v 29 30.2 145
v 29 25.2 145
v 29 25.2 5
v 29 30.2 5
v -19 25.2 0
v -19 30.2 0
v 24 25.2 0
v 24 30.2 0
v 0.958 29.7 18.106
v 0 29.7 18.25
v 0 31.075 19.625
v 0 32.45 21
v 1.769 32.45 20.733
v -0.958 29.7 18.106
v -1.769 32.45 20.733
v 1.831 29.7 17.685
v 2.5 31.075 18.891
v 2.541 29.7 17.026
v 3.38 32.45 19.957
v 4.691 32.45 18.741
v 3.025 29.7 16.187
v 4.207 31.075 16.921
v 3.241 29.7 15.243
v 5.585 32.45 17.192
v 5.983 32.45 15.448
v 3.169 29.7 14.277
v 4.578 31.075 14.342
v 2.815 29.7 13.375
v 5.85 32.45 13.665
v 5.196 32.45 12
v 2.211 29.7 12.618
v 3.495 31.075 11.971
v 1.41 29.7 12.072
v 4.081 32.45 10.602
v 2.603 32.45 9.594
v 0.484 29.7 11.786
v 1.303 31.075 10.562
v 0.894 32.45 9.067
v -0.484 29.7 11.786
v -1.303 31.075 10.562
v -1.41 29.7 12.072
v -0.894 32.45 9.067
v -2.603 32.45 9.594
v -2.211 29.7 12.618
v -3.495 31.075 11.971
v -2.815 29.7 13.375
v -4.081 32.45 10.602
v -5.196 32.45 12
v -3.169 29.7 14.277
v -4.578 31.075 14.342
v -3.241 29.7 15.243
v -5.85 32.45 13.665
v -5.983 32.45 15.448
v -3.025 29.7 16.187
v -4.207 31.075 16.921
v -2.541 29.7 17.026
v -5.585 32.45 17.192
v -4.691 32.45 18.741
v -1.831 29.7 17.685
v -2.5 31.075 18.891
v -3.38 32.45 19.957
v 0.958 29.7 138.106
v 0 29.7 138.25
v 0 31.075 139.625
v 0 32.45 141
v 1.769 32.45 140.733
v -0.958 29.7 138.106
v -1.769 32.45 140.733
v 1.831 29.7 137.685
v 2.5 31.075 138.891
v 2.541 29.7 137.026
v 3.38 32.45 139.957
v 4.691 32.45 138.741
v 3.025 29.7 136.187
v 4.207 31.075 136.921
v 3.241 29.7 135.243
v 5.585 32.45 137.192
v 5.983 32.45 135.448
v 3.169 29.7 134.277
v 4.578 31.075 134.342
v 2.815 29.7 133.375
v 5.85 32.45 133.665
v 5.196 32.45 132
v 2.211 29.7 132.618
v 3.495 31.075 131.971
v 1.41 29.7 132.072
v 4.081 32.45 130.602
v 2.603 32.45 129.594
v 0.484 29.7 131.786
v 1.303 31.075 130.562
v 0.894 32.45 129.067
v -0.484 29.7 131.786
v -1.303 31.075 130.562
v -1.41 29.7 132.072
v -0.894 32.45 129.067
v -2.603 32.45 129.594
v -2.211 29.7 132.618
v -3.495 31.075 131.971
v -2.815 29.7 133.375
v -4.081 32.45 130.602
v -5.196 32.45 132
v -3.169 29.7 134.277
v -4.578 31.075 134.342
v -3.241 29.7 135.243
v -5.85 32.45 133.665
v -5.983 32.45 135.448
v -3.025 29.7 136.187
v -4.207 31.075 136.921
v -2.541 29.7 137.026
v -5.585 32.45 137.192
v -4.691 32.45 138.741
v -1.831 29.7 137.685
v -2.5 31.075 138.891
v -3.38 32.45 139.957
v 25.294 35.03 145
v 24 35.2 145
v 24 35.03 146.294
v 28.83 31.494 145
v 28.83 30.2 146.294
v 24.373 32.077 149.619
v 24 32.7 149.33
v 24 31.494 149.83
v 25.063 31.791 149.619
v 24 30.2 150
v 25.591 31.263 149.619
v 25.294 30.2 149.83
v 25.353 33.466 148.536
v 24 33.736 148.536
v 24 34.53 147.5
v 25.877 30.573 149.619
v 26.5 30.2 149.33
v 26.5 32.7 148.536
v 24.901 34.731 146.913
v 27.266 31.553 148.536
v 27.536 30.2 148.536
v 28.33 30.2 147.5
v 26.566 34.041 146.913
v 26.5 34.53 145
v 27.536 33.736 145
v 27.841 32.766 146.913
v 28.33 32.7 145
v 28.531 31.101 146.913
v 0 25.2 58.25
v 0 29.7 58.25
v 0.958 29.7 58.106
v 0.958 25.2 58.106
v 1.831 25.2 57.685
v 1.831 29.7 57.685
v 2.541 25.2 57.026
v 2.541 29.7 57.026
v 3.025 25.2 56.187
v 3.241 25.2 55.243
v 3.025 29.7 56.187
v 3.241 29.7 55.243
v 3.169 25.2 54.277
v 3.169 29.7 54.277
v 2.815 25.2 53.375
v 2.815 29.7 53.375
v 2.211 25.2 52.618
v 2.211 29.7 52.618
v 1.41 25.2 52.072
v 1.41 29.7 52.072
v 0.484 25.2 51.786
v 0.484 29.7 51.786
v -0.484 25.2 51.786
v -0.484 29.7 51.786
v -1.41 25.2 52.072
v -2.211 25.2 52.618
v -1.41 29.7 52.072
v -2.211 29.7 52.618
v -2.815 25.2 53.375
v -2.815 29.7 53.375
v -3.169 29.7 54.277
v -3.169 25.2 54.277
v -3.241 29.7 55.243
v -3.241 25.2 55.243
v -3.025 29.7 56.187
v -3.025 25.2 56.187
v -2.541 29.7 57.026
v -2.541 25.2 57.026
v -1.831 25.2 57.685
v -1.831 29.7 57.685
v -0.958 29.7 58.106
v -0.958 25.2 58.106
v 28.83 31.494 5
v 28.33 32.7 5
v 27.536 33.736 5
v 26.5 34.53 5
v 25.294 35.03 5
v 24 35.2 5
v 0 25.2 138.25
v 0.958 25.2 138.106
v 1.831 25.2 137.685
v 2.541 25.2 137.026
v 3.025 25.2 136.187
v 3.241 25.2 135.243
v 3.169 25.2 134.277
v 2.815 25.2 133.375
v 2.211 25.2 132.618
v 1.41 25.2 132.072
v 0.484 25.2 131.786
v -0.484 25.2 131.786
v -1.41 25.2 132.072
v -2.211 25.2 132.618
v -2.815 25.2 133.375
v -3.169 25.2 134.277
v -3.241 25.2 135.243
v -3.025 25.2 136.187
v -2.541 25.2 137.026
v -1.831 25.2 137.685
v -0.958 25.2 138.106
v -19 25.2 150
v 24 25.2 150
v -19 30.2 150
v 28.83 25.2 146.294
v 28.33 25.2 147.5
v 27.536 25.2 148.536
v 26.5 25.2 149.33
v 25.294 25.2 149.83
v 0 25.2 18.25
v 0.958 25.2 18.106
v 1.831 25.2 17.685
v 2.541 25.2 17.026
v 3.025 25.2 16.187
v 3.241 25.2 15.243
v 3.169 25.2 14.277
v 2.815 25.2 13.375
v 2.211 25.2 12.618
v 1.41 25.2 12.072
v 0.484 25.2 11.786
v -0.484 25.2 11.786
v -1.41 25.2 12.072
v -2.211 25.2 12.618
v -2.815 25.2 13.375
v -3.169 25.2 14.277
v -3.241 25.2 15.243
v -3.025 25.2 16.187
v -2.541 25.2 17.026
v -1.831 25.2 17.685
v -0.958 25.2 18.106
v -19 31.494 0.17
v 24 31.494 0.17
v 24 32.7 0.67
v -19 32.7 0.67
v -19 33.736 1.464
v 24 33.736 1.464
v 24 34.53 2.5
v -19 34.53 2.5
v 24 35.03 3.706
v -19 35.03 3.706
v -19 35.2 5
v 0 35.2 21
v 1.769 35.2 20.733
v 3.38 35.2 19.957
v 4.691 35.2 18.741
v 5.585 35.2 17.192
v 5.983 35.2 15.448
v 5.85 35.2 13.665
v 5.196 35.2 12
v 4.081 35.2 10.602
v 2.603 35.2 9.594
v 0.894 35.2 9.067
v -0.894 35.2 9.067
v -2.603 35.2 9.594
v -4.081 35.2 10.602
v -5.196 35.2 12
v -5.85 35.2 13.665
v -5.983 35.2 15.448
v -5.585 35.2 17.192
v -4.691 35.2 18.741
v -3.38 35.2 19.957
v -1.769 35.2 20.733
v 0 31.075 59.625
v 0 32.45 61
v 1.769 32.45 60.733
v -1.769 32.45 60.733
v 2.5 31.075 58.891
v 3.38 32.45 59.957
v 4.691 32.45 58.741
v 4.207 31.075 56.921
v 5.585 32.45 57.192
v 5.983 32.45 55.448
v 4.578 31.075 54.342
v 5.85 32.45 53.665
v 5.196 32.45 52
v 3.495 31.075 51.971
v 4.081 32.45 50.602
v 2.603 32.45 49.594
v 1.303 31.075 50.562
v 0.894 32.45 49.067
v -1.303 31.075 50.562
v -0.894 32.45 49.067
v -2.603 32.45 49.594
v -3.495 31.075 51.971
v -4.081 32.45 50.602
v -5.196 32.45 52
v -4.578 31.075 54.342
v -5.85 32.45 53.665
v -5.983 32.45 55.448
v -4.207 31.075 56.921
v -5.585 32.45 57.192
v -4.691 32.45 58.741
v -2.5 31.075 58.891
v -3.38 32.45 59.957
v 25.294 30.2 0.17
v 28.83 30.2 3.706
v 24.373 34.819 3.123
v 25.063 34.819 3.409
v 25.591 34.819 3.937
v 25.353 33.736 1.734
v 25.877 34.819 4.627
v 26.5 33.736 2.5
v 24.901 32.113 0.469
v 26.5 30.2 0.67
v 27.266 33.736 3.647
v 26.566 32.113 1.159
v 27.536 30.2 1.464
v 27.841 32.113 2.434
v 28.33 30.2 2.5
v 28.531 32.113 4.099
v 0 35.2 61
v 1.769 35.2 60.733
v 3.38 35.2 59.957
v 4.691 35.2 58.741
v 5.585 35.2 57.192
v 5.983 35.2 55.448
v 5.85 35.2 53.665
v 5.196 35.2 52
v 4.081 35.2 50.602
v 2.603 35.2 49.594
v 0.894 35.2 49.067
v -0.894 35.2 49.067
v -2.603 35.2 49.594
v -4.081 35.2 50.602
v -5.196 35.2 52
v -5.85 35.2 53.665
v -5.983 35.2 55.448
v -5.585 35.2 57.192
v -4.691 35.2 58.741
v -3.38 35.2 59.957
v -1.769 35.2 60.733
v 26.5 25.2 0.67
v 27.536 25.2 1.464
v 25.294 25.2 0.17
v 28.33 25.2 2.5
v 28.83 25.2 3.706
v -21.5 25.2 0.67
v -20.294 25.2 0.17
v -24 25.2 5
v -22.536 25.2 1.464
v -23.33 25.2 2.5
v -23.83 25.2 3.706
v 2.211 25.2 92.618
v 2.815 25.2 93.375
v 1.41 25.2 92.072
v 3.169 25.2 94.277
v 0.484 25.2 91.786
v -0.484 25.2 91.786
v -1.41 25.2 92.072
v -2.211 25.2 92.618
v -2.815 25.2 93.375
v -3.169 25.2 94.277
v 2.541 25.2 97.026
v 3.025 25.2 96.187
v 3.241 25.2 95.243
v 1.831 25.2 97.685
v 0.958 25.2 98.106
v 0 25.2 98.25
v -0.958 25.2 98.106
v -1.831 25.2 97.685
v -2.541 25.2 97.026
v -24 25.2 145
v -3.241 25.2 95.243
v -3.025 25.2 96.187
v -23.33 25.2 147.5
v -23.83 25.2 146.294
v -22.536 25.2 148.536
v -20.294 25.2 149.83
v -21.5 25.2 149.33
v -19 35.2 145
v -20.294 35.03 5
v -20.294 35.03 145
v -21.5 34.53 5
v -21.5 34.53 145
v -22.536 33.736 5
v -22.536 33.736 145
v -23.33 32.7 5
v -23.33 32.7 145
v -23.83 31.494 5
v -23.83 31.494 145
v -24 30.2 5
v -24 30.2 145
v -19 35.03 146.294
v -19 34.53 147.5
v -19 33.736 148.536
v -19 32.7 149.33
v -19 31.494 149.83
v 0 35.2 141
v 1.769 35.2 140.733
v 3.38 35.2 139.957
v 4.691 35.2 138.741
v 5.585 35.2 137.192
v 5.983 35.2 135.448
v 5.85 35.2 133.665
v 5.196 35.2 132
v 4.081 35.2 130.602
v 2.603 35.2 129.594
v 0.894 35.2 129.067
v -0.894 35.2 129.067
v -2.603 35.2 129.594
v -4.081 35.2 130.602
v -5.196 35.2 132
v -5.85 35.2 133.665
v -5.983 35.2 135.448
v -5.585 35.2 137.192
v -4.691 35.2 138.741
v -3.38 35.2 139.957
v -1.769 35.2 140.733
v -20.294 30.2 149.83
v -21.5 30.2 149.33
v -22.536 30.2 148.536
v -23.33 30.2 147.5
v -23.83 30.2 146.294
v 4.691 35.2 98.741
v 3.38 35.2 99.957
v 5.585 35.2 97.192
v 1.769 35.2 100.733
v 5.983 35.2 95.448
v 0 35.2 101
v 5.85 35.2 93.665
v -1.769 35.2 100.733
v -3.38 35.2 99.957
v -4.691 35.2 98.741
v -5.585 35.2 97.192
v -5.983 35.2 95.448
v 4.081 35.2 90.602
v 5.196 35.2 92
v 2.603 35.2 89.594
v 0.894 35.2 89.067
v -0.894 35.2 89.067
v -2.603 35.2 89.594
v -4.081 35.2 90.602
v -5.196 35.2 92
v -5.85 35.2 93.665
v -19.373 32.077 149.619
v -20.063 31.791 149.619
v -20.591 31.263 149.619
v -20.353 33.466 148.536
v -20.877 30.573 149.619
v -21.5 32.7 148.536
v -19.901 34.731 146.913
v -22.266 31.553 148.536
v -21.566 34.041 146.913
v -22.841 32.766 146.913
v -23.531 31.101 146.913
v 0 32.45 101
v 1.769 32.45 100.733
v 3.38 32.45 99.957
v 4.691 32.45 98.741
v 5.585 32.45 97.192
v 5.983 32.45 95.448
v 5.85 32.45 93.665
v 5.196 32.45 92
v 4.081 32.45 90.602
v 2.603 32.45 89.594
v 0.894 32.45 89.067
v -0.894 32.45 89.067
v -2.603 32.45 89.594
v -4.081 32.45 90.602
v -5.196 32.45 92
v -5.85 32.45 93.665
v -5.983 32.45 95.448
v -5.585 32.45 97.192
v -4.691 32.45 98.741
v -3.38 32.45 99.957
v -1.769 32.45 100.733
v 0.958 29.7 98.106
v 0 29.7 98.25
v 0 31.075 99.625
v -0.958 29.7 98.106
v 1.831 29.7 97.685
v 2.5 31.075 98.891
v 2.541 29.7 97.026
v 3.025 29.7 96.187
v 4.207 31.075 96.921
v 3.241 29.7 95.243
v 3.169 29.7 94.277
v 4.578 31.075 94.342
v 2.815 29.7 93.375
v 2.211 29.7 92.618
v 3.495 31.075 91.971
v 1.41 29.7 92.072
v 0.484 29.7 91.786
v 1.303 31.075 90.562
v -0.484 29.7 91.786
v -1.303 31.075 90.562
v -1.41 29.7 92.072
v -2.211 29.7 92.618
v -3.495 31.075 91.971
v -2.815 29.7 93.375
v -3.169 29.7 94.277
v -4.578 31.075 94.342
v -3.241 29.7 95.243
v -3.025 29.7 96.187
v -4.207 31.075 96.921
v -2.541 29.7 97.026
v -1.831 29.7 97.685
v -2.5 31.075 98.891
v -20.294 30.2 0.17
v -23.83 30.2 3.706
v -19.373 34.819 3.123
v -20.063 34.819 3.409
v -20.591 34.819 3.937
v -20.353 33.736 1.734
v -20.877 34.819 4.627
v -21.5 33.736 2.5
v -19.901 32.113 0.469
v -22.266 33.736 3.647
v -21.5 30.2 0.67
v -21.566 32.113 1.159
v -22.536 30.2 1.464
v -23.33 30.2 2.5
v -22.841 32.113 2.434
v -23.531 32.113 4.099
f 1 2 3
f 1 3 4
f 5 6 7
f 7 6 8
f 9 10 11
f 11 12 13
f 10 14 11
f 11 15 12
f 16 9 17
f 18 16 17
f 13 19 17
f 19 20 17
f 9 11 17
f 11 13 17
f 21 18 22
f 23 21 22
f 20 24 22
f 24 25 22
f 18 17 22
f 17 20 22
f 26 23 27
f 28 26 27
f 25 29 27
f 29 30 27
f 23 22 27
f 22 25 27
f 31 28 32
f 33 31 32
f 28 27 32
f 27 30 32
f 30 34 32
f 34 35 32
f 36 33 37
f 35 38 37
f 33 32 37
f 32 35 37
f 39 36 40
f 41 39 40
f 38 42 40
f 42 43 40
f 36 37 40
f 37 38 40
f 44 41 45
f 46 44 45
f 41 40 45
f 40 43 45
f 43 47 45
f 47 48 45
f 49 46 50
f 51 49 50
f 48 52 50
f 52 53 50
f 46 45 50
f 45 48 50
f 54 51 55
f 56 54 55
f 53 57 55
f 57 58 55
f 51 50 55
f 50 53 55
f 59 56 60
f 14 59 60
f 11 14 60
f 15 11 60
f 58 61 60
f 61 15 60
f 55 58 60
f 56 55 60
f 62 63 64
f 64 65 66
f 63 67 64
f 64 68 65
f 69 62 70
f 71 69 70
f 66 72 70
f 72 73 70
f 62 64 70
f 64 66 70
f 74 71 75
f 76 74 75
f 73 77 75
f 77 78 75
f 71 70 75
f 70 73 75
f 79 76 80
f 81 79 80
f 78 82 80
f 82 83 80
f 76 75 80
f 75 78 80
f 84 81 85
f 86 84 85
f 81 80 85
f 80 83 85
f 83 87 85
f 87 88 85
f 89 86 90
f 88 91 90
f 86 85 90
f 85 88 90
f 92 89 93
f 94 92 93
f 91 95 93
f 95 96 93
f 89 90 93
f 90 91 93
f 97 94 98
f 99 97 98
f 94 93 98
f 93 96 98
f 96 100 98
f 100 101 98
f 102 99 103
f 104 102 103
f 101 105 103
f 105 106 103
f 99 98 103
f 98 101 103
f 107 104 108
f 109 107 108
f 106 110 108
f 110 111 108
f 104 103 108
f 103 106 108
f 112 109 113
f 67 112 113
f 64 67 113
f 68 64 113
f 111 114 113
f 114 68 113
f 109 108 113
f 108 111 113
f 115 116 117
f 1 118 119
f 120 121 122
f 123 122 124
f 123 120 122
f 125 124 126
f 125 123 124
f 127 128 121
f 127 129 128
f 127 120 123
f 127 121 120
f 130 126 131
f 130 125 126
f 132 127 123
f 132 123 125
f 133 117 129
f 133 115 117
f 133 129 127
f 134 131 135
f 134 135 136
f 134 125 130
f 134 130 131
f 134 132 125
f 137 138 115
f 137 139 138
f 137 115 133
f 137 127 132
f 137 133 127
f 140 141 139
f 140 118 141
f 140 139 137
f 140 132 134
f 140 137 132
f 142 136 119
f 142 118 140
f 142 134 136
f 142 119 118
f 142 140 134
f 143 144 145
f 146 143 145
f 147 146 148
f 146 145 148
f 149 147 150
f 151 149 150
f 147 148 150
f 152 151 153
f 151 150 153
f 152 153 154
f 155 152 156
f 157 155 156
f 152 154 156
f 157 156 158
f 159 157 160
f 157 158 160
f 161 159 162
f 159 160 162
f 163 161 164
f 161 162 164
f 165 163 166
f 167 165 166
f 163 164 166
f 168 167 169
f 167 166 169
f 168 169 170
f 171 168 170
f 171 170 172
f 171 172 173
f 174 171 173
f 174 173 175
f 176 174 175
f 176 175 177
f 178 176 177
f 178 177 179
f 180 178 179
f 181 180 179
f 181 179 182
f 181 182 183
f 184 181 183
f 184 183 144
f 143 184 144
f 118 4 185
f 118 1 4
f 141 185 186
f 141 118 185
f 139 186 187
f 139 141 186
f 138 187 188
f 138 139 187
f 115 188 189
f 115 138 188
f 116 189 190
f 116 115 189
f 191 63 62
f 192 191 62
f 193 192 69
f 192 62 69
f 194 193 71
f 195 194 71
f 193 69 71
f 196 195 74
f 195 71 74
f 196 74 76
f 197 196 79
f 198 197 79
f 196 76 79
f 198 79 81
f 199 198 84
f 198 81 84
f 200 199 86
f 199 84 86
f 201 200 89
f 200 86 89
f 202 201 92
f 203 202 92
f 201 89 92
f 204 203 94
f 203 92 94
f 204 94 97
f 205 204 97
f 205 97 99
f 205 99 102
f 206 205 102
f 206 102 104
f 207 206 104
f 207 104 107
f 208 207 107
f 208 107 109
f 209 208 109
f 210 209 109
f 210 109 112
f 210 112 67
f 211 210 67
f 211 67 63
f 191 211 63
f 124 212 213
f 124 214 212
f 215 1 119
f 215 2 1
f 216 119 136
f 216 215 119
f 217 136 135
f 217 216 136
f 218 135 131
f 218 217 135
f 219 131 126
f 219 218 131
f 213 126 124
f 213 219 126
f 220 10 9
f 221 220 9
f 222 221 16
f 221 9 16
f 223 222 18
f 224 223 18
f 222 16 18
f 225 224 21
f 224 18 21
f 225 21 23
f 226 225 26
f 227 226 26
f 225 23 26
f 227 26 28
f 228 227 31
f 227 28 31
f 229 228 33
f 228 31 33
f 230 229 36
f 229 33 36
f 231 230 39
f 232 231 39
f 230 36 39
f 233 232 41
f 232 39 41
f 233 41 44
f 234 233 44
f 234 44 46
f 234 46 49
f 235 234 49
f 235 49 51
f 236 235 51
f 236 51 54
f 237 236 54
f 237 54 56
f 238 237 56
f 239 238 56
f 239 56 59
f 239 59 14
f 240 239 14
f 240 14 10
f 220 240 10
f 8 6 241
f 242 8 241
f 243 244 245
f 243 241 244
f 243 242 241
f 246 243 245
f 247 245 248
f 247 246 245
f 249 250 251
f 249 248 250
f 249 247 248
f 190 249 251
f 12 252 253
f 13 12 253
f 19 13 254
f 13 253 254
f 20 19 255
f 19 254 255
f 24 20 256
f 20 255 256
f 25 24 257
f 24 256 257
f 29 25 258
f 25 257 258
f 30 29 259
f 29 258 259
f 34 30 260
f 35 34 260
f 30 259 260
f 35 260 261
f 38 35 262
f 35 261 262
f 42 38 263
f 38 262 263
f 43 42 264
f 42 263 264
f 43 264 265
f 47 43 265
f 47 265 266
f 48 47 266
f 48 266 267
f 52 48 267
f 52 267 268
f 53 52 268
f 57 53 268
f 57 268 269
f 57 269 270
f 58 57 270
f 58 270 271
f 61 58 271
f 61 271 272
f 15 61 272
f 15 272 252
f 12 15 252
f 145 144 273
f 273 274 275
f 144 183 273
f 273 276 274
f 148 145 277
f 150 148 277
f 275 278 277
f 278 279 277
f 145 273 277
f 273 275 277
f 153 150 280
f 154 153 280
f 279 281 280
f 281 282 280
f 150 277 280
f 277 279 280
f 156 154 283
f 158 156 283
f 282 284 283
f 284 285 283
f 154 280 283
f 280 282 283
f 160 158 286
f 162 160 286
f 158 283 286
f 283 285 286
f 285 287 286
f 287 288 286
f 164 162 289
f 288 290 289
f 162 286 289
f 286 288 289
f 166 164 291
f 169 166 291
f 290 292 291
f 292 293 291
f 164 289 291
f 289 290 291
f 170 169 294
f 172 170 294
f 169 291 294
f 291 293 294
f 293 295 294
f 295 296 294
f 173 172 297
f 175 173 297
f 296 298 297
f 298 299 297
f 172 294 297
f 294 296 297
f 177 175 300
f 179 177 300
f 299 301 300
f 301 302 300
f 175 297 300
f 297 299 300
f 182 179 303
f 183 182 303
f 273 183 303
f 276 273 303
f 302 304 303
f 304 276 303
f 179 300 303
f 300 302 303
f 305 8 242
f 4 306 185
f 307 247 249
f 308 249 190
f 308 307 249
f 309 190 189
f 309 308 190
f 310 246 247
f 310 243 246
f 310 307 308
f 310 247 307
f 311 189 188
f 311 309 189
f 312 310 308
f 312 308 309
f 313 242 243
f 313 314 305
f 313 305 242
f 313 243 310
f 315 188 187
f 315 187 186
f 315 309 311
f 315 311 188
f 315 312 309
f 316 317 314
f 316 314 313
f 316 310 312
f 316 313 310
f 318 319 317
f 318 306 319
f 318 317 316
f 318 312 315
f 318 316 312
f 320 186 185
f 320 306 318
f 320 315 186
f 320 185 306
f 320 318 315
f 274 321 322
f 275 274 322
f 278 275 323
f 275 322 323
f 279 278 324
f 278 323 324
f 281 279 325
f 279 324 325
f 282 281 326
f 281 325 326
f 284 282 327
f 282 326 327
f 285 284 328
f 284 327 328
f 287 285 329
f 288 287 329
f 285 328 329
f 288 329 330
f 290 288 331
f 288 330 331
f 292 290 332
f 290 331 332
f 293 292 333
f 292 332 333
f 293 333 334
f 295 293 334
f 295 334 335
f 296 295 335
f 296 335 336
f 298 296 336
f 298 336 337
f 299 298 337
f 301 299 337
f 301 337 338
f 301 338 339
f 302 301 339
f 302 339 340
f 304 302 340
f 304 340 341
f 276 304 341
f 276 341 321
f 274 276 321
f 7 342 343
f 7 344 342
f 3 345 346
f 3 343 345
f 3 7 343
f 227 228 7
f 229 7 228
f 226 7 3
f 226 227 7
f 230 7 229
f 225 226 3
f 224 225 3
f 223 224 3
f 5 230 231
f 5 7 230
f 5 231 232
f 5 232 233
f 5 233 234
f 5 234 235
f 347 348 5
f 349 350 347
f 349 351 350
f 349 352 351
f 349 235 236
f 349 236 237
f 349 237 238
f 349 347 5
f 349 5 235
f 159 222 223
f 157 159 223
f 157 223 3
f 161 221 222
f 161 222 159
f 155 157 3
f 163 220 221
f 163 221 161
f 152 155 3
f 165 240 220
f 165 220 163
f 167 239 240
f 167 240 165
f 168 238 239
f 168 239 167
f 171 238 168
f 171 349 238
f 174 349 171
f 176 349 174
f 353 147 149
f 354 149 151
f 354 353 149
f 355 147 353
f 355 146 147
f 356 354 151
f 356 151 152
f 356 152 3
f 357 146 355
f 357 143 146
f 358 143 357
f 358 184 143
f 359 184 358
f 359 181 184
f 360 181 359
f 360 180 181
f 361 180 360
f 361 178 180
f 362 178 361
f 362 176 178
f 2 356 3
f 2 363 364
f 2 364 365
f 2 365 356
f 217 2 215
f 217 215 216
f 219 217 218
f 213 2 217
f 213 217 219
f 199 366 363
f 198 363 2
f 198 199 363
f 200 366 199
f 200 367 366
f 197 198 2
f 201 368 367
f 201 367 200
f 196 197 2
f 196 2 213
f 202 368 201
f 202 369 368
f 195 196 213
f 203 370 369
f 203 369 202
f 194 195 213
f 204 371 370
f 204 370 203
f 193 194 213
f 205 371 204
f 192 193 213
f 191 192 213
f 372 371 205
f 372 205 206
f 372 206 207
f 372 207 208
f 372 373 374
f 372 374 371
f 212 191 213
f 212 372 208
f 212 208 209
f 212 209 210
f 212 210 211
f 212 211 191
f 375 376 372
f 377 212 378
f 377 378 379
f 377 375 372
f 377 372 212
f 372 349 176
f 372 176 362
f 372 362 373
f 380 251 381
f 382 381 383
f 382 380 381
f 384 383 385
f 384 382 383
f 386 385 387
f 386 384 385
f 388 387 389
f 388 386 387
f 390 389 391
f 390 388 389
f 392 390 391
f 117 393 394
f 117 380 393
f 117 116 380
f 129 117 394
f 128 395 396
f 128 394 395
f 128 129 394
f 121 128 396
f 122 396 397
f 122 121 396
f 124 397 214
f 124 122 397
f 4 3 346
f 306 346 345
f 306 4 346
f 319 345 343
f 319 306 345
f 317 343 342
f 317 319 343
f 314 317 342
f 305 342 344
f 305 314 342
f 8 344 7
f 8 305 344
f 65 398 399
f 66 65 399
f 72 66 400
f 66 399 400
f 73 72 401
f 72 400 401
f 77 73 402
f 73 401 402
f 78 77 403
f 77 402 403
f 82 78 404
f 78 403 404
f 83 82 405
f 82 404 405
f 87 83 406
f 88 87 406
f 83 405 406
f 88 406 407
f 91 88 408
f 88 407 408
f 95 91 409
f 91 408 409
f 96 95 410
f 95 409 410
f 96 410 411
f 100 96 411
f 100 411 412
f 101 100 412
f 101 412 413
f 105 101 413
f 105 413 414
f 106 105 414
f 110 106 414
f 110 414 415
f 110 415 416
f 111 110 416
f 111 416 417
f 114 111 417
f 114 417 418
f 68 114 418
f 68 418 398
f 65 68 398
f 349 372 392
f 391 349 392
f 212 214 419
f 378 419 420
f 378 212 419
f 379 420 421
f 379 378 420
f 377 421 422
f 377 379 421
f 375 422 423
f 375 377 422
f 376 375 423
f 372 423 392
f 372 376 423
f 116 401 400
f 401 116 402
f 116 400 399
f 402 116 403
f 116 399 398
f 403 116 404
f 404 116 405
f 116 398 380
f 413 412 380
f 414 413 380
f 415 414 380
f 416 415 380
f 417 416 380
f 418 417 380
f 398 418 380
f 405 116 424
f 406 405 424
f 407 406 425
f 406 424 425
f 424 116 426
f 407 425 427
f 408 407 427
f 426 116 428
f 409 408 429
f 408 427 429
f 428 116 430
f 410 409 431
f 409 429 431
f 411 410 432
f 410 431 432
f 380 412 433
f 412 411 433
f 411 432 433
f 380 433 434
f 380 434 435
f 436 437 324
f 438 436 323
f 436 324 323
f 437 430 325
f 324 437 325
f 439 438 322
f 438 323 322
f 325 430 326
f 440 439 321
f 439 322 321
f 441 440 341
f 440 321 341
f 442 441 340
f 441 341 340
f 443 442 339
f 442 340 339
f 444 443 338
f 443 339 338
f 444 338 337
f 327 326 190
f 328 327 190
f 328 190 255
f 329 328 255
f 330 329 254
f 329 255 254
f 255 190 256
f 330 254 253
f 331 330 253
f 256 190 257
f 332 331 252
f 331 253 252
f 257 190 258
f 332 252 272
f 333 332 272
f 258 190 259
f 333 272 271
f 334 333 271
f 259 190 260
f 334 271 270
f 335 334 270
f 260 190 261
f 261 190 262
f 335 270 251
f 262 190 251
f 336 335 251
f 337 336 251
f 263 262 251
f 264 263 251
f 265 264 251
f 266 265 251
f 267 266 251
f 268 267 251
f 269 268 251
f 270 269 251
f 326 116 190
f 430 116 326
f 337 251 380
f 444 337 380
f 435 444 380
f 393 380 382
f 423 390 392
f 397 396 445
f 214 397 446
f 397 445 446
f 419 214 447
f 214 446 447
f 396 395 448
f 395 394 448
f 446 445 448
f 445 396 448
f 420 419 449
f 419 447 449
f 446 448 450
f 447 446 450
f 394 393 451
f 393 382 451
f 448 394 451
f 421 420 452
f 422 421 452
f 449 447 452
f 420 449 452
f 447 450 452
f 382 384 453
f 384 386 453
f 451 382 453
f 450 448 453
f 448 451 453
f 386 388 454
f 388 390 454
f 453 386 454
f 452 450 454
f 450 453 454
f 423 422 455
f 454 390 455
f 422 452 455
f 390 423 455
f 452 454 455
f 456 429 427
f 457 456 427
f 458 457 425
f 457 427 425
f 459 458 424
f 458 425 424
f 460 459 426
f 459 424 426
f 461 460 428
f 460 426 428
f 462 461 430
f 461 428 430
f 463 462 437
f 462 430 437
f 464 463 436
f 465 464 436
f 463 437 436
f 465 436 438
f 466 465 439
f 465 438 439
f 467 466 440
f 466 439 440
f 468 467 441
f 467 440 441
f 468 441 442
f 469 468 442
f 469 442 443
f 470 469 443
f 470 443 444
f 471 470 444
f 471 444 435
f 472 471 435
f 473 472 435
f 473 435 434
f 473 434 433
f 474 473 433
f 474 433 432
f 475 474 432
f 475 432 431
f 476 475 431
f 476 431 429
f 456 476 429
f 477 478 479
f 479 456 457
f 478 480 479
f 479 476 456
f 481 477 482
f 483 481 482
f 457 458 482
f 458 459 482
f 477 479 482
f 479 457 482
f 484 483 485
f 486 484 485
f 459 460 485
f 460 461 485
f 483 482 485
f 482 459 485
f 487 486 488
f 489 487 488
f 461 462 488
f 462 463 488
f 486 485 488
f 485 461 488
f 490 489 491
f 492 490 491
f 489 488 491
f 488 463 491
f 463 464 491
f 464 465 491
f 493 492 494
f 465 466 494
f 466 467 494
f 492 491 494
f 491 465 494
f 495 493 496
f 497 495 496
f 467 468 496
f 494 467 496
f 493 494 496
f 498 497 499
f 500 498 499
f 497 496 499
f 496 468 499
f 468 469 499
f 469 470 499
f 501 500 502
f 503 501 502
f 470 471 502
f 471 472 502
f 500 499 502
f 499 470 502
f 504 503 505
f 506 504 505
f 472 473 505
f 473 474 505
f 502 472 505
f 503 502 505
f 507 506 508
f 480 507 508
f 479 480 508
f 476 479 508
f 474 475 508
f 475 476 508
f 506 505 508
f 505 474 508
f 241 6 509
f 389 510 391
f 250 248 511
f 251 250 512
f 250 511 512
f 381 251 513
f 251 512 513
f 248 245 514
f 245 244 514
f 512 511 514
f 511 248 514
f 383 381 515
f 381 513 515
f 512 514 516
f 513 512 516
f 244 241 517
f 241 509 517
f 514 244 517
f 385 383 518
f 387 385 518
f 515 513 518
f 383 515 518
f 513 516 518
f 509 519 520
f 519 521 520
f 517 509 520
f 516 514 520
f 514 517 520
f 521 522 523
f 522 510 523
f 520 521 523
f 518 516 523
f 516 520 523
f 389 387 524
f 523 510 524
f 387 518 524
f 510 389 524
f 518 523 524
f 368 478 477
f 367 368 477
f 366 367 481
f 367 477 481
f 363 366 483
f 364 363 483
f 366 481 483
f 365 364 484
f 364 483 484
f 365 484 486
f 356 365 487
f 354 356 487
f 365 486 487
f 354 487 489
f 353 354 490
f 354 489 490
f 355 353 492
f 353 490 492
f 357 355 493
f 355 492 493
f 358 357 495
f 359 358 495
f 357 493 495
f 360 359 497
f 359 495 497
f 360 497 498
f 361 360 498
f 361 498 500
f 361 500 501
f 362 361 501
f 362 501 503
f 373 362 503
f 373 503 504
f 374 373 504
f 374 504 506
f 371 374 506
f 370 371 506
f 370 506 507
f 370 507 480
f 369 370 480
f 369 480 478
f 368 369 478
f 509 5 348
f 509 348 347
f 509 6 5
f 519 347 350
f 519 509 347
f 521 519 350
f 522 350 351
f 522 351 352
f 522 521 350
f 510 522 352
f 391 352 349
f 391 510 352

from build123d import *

# Parameters (mm, degrees)
SKETCH1_W               = 48
SKETCH1_H               = 48
SKETCH1_R               = 13.75
SKETCH1_H_2             = 10
BOSS_EXTRUDE1_DEPTH     = 230
SKETCH3_R               = 6
CUT_EXTRUDE1_DEPTH      = 0.5
SKETCH4_R               = 3.25
CUT_EXTRUDE2_DEPTH      = 240.26061105
CUT_EXTRUDE3_REACH      = 241.261
CUT_EXTRUDE3_END_RADIUS = 13.75
SKETCH5_R               = 6.5
CUT_EXTRUDE4_REACH      = 243.738
CUT_EXTRUDE4_END_RADIUS = 13.75
CUT_EXTRUDE4_START      = -5
CHAMFER1_SIZE           = 5
SKETCH8_W               = 230
SKETCH8_H               = 1.2
CUT_EXTRUDE5_DEPTH      = 10
SKETCH9_W               = 53
SKETCH9_H               = 80
CUT_EXTRUDE6_DEPTH      = 233.036635039
FILLET2_R               = 5


with BuildPart() as part:
    # Sketch1 → Boss-Extrude1 (new body)
    # profile 1 of 3: a face of its own
    with BuildSketch(Plane.XY):
        Rectangle(SKETCH1_W, SKETCH1_H)
        Circle(SKETCH1_R, mode=Mode.SUBTRACT)
    # profile 2 of 3: a face of its own
    with BuildSketch(Plane.XY):
        with Locations((0, 30.2)):
            Rectangle(SKETCH1_W, SKETCH1_H_2)
    # profile 3 of 3: a face of its own
    with BuildSketch(Plane.XY):
        Polygon((24, 24), (24, -24), (29, -24), (29, 35.2), (24, 35.2), (24, 25.2), align=None)
    extrude(amount=BOSS_EXTRUDE1_DEPTH)

    # Sketch3 → Cut-Extrude1 (cut)
    with BuildSketch(Plane(origin=(0, 35.2, 0), x_dir=(1, 0, 0), z_dir=(0, 1, 0))):
        with Locations(Location((0, -15, 0), (0, 0, 270))):
            Circle(SKETCH3_R)
        with Locations(Location((0, -55, 0), (0, 0, 270))):
            Circle(SKETCH3_R)
        with Locations(Location((0, -95, 0), (0, 0, 270))):
            Circle(SKETCH3_R)
        with Locations(Location((0, -135, 0), (0, 0, 270))):
            Circle(SKETCH3_R)
        with Locations(Location((0, -175, 0), (0, 0, 270))):
            Circle(SKETCH3_R)
        with Locations(Location((0, -215, 0), (0, 0, 270))):
            Circle(SKETCH3_R)
    extrude(amount=-CUT_EXTRUDE1_DEPTH, mode=Mode.SUBTRACT)

    # Sketch4 → Cut-Extrude2 (cut, through all)
    with BuildSketch(Plane(origin=(0, 35.2, 0), x_dir=(1, 0, 0), z_dir=(0, 1, 0))):
        with Locations(Location((0, -15, 0), (0, 0, 270))):
            Circle(SKETCH4_R)
        with Locations(Location((0, -55, 0), (0, 0, 270))):
            Circle(SKETCH4_R)
        with Locations(Location((0, -95, 0), (0, 0, 270))):
            Circle(SKETCH4_R)
        with Locations(Location((0, -135, 0), (0, 0, 270))):
            Circle(SKETCH4_R)
        with Locations(Location((0, -175, 0), (0, 0, 270))):
            Circle(SKETCH4_R)
        with Locations(Location((0, -215, 0), (0, 0, 270))):
            Circle(SKETCH4_R)
    extrude(amount=-CUT_EXTRUDE2_DEPTH, mode=Mode.SUBTRACT)

    # Cut-Extrude3: up to this cylinder (the profile starts outside it)
    cut_extrude3_end = Plane(origin=(0, 0, 115), z_dir=(0, 0, -1)) * Cylinder(CUT_EXTRUDE3_END_RADIUS, 711.022, mode=Mode.PRIVATE)
    # Sketch5 → Cut-Extrude3 (cut, up to the surface)
    with BuildSketch(Plane.XZ.offset(24), mode=Mode.PRIVATE) as cut_extrude3_sk1:
        with Locations(Location((0, 215, 0), (0, 0, 270))):
            Circle(SKETCH5_R)
    cut_extrude3_tool1 = extrude(cut_extrude3_sk1.sketch, amount=-CUT_EXTRUDE3_REACH, mode=Mode.PRIVATE) - cut_extrude3_end
    add(cut_extrude3_tool1.solids().sort_by_distance((0, -24, 215))[0], mode=Mode.SUBTRACT)
    # Sketch5 → Cut-Extrude3 (cut, up to the surface)
    with BuildSketch(Plane.XZ.offset(24), mode=Mode.PRIVATE) as cut_extrude3_sk2:
        with Locations(Location((0, 175, 0), (0, 0, 270))):
            Circle(SKETCH5_R)
    cut_extrude3_tool2 = extrude(cut_extrude3_sk2.sketch, amount=-CUT_EXTRUDE3_REACH, mode=Mode.PRIVATE) - cut_extrude3_end
    add(cut_extrude3_tool2.solids().sort_by_distance((0, -24, 175))[0], mode=Mode.SUBTRACT)
    # Sketch5 → Cut-Extrude3 (cut, up to the surface)
    with BuildSketch(Plane.XZ.offset(24), mode=Mode.PRIVATE) as cut_extrude3_sk3:
        with Locations(Location((0, 135, 0), (0, 0, 270))):
            Circle(SKETCH5_R)
    cut_extrude3_tool3 = extrude(cut_extrude3_sk3.sketch, amount=-CUT_EXTRUDE3_REACH, mode=Mode.PRIVATE) - cut_extrude3_end
    add(cut_extrude3_tool3.solids().sort_by_distance((0, -24, 135))[0], mode=Mode.SUBTRACT)
    # Sketch5 → Cut-Extrude3 (cut, up to the surface)
    with BuildSketch(Plane.XZ.offset(24), mode=Mode.PRIVATE) as cut_extrude3_sk4:
        with Locations(Location((0, 95, 0), (0, 0, 270))):
            Circle(SKETCH5_R)
    cut_extrude3_tool4 = extrude(cut_extrude3_sk4.sketch, amount=-CUT_EXTRUDE3_REACH, mode=Mode.PRIVATE) - cut_extrude3_end
    add(cut_extrude3_tool4.solids().sort_by_distance((0, -24, 95))[0], mode=Mode.SUBTRACT)
    # Sketch5 → Cut-Extrude3 (cut, up to the surface)
    with BuildSketch(Plane.XZ.offset(24), mode=Mode.PRIVATE) as cut_extrude3_sk5:
        with Locations(Location((0, 55, 0), (0, 0, 270))):
            Circle(SKETCH5_R)
    cut_extrude3_tool5 = extrude(cut_extrude3_sk5.sketch, amount=-CUT_EXTRUDE3_REACH, mode=Mode.PRIVATE) - cut_extrude3_end
    add(cut_extrude3_tool5.solids().sort_by_distance((0, -24, 55))[0], mode=Mode.SUBTRACT)
    # Sketch5 → Cut-Extrude3 (cut, up to the surface)
    with BuildSketch(Plane.XZ.offset(24), mode=Mode.PRIVATE) as cut_extrude3_sk6:
        with Locations(Location((0, 15, 0), (0, 0, 270))):
            Circle(SKETCH5_R)
    cut_extrude3_tool6 = extrude(cut_extrude3_sk6.sketch, amount=-CUT_EXTRUDE3_REACH, mode=Mode.PRIVATE) - cut_extrude3_end
    add(cut_extrude3_tool6.solids().sort_by_distance((0, -24, 15))[0], mode=Mode.SUBTRACT)

    # Cut-Extrude4: up to this cylinder (the profile starts outside it)
    cut_extrude4_end = Plane(origin=(0, 0, 115), z_dir=(0, 0, -1)) * Cylinder(CUT_EXTRUDE4_END_RADIUS, 715.976, mode=Mode.PRIVATE)
    # Sketch7 → Cut-Extrude4 (cut, up to the surface)
    with BuildSketch(Plane(origin=(0, 24, 0), x_dir=(1, 0, 0), z_dir=(0, 1, 0)).offset(CUT_EXTRUDE4_START), mode=Mode.PRIVATE) as cut_extrude4_sk1:
        Polygon((0, -8.533676985), (-5.6, -11.766838493), (-5.6, -18.233161507), (0, -21.466323015), (5.6, -18.233161507), (5.6, -11.766838493), align=None)
    cut_extrude4_tool1 = extrude(cut_extrude4_sk1.sketch, amount=-CUT_EXTRUDE4_REACH, mode=Mode.PRIVATE) - cut_extrude4_end
    add(cut_extrude4_tool1.solids().sort_by_distance((0, 19, 15))[0], mode=Mode.SUBTRACT)
    # Sketch7 → Cut-Extrude4 (cut, up to the surface)
    with BuildSketch(Plane(origin=(0, 24, 0), x_dir=(1, 0, 0), z_dir=(0, 1, 0)).offset(CUT_EXTRUDE4_START), mode=Mode.PRIVATE) as cut_extrude4_sk2:
        Polygon((0, -48.533676985), (-5.6, -51.766838493), (-5.6, -58.233161507), (0, -61.466323015), (5.6, -58.233161507), (5.6, -51.766838493), align=None)
    cut_extrude4_tool2 = extrude(cut_extrude4_sk2.sketch, amount=-CUT_EXTRUDE4_REACH, mode=Mode.PRIVATE) - cut_extrude4_end
    add(cut_extrude4_tool2.solids().sort_by_distance((0, 19, 55))[0], mode=Mode.SUBTRACT)
    # Sketch7 → Cut-Extrude4 (cut, up to the surface)
    with BuildSketch(Plane(origin=(0, 24, 0), x_dir=(1, 0, 0), z_dir=(0, 1, 0)).offset(CUT_EXTRUDE4_START), mode=Mode.PRIVATE) as cut_extrude4_sk3:
        Polygon((0, -88.533676985), (-5.6, -91.766838493), (-5.6, -98.233161507), (0, -101.466323015), (5.6, -98.233161507), (5.6, -91.766838493), align=None)
    cut_extrude4_tool3 = extrude(cut_extrude4_sk3.sketch, amount=-CUT_EXTRUDE4_REACH, mode=Mode.PRIVATE) - cut_extrude4_end
    add(cut_extrude4_tool3.solids().sort_by_distance((0, 19, 95))[0], mode=Mode.SUBTRACT)
    # Sketch7 → Cut-Extrude4 (cut, up to the surface)
    with BuildSketch(Plane(origin=(0, 24, 0), x_dir=(1, 0, 0), z_dir=(0, 1, 0)).offset(CUT_EXTRUDE4_START), mode=Mode.PRIVATE) as cut_extrude4_sk4:
        Polygon((0, -128.533676985), (-5.6, -131.766838493), (-5.6, -138.233161507), (0, -141.466323015), (5.6, -138.233161507), (5.6, -131.766838493), align=None)
    cut_extrude4_tool4 = extrude(cut_extrude4_sk4.sketch, amount=-CUT_EXTRUDE4_REACH, mode=Mode.PRIVATE) - cut_extrude4_end
    add(cut_extrude4_tool4.solids().sort_by_distance((0, 19, 135))[0], mode=Mode.SUBTRACT)
    # Sketch7 → Cut-Extrude4 (cut, up to the surface)
    with BuildSketch(Plane(origin=(0, 24, 0), x_dir=(1, 0, 0), z_dir=(0, 1, 0)).offset(CUT_EXTRUDE4_START), mode=Mode.PRIVATE) as cut_extrude4_sk5:
        Polygon((0, -168.533676985), (-5.6, -171.766838493), (-5.6, -178.233161507), (0, -181.466323015), (5.6, -178.233161507), (5.6, -171.766838493), align=None)
    cut_extrude4_tool5 = extrude(cut_extrude4_sk5.sketch, amount=-CUT_EXTRUDE4_REACH, mode=Mode.PRIVATE) - cut_extrude4_end
    add(cut_extrude4_tool5.solids().sort_by_distance((0, 19, 175))[0], mode=Mode.SUBTRACT)
    # Sketch7 → Cut-Extrude4 (cut, up to the surface)
    with BuildSketch(Plane(origin=(0, 24, 0), x_dir=(1, 0, 0), z_dir=(0, 1, 0)).offset(CUT_EXTRUDE4_START), mode=Mode.PRIVATE) as cut_extrude4_sk6:
        Polygon((0, -208.533676985), (-5.6, -211.766838493), (-5.6, -218.233161507), (0, -221.466323015), (5.6, -218.233161507), (5.6, -211.766838493), align=None)
    cut_extrude4_tool6 = extrude(cut_extrude4_sk6.sketch, amount=-CUT_EXTRUDE4_REACH, mode=Mode.PRIVATE) - cut_extrude4_end
    add(cut_extrude4_tool6.solids().sort_by_distance((0, 19, 215))[0], mode=Mode.SUBTRACT)

    # Chamfer1
    # the kernel refuses this chamfer: 5 mm, written as the material it takes off along each edge
    with BuildSketch(Plane(origin=(0, 34.7, 215), x_dir=(0, 0, 1), z_dir=(-1, 0, 0))) as chamfer1_piece_1_section:
        Polygon((3.25, -CHAMFER1_SIZE), (3.25 + CHAMFER1_SIZE, 0), (3.25, 0), align=None)
    chamfer1_piece_1 = revolve(axis=Axis((0, 34.7, 215), (0, 1, 0)), mode=Mode.PRIVATE)
    chamfer1_piece_1 = chamfer1_piece_1 & Plane(origin=(0, 31.051548399, 215), x_dir=(0, 0, 1), z_dir=(0, 1, 0)) * Cylinder(6, 33, mode=Mode.PRIVATE)
    add(chamfer1_piece_1, mode=Mode.SUBTRACT)
    with BuildSketch(Plane(origin=(0, 34.7, 175), x_dir=(0, 0, 1), z_dir=(-1, 0, 0))) as chamfer1_piece_2_section:
        Polygon((3.25, -CHAMFER1_SIZE), (3.25 + CHAMFER1_SIZE, 0), (3.25, 0), align=None)
    chamfer1_piece_2 = revolve(axis=Axis((0, 34.7, 175), (0, 1, 0)), mode=Mode.PRIVATE)
    chamfer1_piece_2 = chamfer1_piece_2 & Plane(origin=(0, 31.051548399, 175), x_dir=(0, 0, 1), z_dir=(0, 1, 0)) * Cylinder(6, 33, mode=Mode.PRIVATE)
    add(chamfer1_piece_2, mode=Mode.SUBTRACT)
    with BuildSketch(Plane(origin=(0, 34.7, 135), x_dir=(0, 0, 1), z_dir=(-1, 0, 0))) as chamfer1_piece_3_section:
        Polygon((3.25, -CHAMFER1_SIZE), (3.25 + CHAMFER1_SIZE, 0), (3.25, 0), align=None)
    chamfer1_piece_3 = revolve(axis=Axis((0, 34.7, 135), (0, 1, 0)), mode=Mode.PRIVATE)
    chamfer1_piece_3 = chamfer1_piece_3 & Plane(origin=(0, 31.051548399, 135), x_dir=(0, 0, 1), z_dir=(0, 1, 0)) * Cylinder(6, 33, mode=Mode.PRIVATE)
    add(chamfer1_piece_3, mode=Mode.SUBTRACT)
    with BuildSketch(Plane(origin=(0, 34.7, 95), x_dir=(0, 0, 1), z_dir=(-1, 0, 0))) as chamfer1_piece_4_section:
        Polygon((3.25, -CHAMFER1_SIZE), (3.25 + CHAMFER1_SIZE, 0), (3.25, 0), align=None)
    chamfer1_piece_4 = revolve(axis=Axis((0, 34.7, 95), (0, 1, 0)), mode=Mode.PRIVATE)
    chamfer1_piece_4 = chamfer1_piece_4 & Plane(origin=(0, 31.051548399, 95), x_dir=(0, 0, 1), z_dir=(0, 1, 0)) * Cylinder(6, 33, mode=Mode.PRIVATE)
    add(chamfer1_piece_4, mode=Mode.SUBTRACT)
    with BuildSketch(Plane(origin=(0, 34.7, 55), x_dir=(0, 0, 1), z_dir=(-1, 0, 0))) as chamfer1_piece_5_section:
        Polygon((3.25, -CHAMFER1_SIZE), (3.25 + CHAMFER1_SIZE, 0), (3.25, 0), align=None)
    chamfer1_piece_5 = revolve(axis=Axis((0, 34.7, 55), (0, 1, 0)), mode=Mode.PRIVATE)
    chamfer1_piece_5 = chamfer1_piece_5 & Plane(origin=(0, 31.051548399, 55), x_dir=(0, 0, 1), z_dir=(0, 1, 0)) * Cylinder(6, 33, mode=Mode.PRIVATE)
    add(chamfer1_piece_5, mode=Mode.SUBTRACT)
    with BuildSketch(Plane(origin=(0, 34.7, 15), x_dir=(0, 0, 1), z_dir=(-1, 0, 0))) as chamfer1_piece_6_section:
        Polygon((3.25, -CHAMFER1_SIZE), (3.25 + CHAMFER1_SIZE, 0), (3.25, 0), align=None)
    chamfer1_piece_6 = revolve(axis=Axis((0, 34.7, 15), (0, 1, 0)), mode=Mode.PRIVATE)
    chamfer1_piece_6 = chamfer1_piece_6 & Plane(origin=(0, 31.051548399, 15), x_dir=(0, 0, 1), z_dir=(0, 1, 0)) * Cylinder(6, 33, mode=Mode.PRIVATE)
    add(chamfer1_piece_6, mode=Mode.SUBTRACT)

    # Sketch8 → Cut-Extrude5 (cut)
    with BuildSketch(Plane.ZY.offset(-24)):
        with Locations((115, 24.6)):
            Rectangle(SKETCH8_W, SKETCH8_H)
    extrude(amount=-CUT_EXTRUDE5_DEPTH, mode=Mode.SUBTRACT)


with BuildPart() as body_2:
    # of the pieces the cut leaves, the one that is kept (cut_extrude5_keep)
    add(part.part.solids().sort_by_distance((29, 25.2, 0))[0])

    # Sketch9 → Cut-Extrude6 (cut, through all)
    with BuildSketch(Plane(origin=(0, 35.2, 0), x_dir=(1, 0, 0), z_dir=(0, 1, 0))):
        with Locations((2.5, -190)):
            Rectangle(SKETCH9_W, SKETCH9_H)
    extrude(amount=-CUT_EXTRUDE6_DEPTH, mode=Mode.SUBTRACT)

    # Fillet2
    fillet2_edges = [body_2.edges().sort_by_distance(p)[0] for p in [
        (29, 30.2, 0),
        (-24, 30.2, 0),
        (2.5, 35.2, 0),
        (-24, 35.2, 75),
        (29, 35.2, 75),
        (2.5, 35.2, 150),
        (-24, 30.2, 150),
        (29, 30.2, 150),
    ]]
    fillet(fillet2_edges, radius=FILLET2_R)


solid = body_2.part
